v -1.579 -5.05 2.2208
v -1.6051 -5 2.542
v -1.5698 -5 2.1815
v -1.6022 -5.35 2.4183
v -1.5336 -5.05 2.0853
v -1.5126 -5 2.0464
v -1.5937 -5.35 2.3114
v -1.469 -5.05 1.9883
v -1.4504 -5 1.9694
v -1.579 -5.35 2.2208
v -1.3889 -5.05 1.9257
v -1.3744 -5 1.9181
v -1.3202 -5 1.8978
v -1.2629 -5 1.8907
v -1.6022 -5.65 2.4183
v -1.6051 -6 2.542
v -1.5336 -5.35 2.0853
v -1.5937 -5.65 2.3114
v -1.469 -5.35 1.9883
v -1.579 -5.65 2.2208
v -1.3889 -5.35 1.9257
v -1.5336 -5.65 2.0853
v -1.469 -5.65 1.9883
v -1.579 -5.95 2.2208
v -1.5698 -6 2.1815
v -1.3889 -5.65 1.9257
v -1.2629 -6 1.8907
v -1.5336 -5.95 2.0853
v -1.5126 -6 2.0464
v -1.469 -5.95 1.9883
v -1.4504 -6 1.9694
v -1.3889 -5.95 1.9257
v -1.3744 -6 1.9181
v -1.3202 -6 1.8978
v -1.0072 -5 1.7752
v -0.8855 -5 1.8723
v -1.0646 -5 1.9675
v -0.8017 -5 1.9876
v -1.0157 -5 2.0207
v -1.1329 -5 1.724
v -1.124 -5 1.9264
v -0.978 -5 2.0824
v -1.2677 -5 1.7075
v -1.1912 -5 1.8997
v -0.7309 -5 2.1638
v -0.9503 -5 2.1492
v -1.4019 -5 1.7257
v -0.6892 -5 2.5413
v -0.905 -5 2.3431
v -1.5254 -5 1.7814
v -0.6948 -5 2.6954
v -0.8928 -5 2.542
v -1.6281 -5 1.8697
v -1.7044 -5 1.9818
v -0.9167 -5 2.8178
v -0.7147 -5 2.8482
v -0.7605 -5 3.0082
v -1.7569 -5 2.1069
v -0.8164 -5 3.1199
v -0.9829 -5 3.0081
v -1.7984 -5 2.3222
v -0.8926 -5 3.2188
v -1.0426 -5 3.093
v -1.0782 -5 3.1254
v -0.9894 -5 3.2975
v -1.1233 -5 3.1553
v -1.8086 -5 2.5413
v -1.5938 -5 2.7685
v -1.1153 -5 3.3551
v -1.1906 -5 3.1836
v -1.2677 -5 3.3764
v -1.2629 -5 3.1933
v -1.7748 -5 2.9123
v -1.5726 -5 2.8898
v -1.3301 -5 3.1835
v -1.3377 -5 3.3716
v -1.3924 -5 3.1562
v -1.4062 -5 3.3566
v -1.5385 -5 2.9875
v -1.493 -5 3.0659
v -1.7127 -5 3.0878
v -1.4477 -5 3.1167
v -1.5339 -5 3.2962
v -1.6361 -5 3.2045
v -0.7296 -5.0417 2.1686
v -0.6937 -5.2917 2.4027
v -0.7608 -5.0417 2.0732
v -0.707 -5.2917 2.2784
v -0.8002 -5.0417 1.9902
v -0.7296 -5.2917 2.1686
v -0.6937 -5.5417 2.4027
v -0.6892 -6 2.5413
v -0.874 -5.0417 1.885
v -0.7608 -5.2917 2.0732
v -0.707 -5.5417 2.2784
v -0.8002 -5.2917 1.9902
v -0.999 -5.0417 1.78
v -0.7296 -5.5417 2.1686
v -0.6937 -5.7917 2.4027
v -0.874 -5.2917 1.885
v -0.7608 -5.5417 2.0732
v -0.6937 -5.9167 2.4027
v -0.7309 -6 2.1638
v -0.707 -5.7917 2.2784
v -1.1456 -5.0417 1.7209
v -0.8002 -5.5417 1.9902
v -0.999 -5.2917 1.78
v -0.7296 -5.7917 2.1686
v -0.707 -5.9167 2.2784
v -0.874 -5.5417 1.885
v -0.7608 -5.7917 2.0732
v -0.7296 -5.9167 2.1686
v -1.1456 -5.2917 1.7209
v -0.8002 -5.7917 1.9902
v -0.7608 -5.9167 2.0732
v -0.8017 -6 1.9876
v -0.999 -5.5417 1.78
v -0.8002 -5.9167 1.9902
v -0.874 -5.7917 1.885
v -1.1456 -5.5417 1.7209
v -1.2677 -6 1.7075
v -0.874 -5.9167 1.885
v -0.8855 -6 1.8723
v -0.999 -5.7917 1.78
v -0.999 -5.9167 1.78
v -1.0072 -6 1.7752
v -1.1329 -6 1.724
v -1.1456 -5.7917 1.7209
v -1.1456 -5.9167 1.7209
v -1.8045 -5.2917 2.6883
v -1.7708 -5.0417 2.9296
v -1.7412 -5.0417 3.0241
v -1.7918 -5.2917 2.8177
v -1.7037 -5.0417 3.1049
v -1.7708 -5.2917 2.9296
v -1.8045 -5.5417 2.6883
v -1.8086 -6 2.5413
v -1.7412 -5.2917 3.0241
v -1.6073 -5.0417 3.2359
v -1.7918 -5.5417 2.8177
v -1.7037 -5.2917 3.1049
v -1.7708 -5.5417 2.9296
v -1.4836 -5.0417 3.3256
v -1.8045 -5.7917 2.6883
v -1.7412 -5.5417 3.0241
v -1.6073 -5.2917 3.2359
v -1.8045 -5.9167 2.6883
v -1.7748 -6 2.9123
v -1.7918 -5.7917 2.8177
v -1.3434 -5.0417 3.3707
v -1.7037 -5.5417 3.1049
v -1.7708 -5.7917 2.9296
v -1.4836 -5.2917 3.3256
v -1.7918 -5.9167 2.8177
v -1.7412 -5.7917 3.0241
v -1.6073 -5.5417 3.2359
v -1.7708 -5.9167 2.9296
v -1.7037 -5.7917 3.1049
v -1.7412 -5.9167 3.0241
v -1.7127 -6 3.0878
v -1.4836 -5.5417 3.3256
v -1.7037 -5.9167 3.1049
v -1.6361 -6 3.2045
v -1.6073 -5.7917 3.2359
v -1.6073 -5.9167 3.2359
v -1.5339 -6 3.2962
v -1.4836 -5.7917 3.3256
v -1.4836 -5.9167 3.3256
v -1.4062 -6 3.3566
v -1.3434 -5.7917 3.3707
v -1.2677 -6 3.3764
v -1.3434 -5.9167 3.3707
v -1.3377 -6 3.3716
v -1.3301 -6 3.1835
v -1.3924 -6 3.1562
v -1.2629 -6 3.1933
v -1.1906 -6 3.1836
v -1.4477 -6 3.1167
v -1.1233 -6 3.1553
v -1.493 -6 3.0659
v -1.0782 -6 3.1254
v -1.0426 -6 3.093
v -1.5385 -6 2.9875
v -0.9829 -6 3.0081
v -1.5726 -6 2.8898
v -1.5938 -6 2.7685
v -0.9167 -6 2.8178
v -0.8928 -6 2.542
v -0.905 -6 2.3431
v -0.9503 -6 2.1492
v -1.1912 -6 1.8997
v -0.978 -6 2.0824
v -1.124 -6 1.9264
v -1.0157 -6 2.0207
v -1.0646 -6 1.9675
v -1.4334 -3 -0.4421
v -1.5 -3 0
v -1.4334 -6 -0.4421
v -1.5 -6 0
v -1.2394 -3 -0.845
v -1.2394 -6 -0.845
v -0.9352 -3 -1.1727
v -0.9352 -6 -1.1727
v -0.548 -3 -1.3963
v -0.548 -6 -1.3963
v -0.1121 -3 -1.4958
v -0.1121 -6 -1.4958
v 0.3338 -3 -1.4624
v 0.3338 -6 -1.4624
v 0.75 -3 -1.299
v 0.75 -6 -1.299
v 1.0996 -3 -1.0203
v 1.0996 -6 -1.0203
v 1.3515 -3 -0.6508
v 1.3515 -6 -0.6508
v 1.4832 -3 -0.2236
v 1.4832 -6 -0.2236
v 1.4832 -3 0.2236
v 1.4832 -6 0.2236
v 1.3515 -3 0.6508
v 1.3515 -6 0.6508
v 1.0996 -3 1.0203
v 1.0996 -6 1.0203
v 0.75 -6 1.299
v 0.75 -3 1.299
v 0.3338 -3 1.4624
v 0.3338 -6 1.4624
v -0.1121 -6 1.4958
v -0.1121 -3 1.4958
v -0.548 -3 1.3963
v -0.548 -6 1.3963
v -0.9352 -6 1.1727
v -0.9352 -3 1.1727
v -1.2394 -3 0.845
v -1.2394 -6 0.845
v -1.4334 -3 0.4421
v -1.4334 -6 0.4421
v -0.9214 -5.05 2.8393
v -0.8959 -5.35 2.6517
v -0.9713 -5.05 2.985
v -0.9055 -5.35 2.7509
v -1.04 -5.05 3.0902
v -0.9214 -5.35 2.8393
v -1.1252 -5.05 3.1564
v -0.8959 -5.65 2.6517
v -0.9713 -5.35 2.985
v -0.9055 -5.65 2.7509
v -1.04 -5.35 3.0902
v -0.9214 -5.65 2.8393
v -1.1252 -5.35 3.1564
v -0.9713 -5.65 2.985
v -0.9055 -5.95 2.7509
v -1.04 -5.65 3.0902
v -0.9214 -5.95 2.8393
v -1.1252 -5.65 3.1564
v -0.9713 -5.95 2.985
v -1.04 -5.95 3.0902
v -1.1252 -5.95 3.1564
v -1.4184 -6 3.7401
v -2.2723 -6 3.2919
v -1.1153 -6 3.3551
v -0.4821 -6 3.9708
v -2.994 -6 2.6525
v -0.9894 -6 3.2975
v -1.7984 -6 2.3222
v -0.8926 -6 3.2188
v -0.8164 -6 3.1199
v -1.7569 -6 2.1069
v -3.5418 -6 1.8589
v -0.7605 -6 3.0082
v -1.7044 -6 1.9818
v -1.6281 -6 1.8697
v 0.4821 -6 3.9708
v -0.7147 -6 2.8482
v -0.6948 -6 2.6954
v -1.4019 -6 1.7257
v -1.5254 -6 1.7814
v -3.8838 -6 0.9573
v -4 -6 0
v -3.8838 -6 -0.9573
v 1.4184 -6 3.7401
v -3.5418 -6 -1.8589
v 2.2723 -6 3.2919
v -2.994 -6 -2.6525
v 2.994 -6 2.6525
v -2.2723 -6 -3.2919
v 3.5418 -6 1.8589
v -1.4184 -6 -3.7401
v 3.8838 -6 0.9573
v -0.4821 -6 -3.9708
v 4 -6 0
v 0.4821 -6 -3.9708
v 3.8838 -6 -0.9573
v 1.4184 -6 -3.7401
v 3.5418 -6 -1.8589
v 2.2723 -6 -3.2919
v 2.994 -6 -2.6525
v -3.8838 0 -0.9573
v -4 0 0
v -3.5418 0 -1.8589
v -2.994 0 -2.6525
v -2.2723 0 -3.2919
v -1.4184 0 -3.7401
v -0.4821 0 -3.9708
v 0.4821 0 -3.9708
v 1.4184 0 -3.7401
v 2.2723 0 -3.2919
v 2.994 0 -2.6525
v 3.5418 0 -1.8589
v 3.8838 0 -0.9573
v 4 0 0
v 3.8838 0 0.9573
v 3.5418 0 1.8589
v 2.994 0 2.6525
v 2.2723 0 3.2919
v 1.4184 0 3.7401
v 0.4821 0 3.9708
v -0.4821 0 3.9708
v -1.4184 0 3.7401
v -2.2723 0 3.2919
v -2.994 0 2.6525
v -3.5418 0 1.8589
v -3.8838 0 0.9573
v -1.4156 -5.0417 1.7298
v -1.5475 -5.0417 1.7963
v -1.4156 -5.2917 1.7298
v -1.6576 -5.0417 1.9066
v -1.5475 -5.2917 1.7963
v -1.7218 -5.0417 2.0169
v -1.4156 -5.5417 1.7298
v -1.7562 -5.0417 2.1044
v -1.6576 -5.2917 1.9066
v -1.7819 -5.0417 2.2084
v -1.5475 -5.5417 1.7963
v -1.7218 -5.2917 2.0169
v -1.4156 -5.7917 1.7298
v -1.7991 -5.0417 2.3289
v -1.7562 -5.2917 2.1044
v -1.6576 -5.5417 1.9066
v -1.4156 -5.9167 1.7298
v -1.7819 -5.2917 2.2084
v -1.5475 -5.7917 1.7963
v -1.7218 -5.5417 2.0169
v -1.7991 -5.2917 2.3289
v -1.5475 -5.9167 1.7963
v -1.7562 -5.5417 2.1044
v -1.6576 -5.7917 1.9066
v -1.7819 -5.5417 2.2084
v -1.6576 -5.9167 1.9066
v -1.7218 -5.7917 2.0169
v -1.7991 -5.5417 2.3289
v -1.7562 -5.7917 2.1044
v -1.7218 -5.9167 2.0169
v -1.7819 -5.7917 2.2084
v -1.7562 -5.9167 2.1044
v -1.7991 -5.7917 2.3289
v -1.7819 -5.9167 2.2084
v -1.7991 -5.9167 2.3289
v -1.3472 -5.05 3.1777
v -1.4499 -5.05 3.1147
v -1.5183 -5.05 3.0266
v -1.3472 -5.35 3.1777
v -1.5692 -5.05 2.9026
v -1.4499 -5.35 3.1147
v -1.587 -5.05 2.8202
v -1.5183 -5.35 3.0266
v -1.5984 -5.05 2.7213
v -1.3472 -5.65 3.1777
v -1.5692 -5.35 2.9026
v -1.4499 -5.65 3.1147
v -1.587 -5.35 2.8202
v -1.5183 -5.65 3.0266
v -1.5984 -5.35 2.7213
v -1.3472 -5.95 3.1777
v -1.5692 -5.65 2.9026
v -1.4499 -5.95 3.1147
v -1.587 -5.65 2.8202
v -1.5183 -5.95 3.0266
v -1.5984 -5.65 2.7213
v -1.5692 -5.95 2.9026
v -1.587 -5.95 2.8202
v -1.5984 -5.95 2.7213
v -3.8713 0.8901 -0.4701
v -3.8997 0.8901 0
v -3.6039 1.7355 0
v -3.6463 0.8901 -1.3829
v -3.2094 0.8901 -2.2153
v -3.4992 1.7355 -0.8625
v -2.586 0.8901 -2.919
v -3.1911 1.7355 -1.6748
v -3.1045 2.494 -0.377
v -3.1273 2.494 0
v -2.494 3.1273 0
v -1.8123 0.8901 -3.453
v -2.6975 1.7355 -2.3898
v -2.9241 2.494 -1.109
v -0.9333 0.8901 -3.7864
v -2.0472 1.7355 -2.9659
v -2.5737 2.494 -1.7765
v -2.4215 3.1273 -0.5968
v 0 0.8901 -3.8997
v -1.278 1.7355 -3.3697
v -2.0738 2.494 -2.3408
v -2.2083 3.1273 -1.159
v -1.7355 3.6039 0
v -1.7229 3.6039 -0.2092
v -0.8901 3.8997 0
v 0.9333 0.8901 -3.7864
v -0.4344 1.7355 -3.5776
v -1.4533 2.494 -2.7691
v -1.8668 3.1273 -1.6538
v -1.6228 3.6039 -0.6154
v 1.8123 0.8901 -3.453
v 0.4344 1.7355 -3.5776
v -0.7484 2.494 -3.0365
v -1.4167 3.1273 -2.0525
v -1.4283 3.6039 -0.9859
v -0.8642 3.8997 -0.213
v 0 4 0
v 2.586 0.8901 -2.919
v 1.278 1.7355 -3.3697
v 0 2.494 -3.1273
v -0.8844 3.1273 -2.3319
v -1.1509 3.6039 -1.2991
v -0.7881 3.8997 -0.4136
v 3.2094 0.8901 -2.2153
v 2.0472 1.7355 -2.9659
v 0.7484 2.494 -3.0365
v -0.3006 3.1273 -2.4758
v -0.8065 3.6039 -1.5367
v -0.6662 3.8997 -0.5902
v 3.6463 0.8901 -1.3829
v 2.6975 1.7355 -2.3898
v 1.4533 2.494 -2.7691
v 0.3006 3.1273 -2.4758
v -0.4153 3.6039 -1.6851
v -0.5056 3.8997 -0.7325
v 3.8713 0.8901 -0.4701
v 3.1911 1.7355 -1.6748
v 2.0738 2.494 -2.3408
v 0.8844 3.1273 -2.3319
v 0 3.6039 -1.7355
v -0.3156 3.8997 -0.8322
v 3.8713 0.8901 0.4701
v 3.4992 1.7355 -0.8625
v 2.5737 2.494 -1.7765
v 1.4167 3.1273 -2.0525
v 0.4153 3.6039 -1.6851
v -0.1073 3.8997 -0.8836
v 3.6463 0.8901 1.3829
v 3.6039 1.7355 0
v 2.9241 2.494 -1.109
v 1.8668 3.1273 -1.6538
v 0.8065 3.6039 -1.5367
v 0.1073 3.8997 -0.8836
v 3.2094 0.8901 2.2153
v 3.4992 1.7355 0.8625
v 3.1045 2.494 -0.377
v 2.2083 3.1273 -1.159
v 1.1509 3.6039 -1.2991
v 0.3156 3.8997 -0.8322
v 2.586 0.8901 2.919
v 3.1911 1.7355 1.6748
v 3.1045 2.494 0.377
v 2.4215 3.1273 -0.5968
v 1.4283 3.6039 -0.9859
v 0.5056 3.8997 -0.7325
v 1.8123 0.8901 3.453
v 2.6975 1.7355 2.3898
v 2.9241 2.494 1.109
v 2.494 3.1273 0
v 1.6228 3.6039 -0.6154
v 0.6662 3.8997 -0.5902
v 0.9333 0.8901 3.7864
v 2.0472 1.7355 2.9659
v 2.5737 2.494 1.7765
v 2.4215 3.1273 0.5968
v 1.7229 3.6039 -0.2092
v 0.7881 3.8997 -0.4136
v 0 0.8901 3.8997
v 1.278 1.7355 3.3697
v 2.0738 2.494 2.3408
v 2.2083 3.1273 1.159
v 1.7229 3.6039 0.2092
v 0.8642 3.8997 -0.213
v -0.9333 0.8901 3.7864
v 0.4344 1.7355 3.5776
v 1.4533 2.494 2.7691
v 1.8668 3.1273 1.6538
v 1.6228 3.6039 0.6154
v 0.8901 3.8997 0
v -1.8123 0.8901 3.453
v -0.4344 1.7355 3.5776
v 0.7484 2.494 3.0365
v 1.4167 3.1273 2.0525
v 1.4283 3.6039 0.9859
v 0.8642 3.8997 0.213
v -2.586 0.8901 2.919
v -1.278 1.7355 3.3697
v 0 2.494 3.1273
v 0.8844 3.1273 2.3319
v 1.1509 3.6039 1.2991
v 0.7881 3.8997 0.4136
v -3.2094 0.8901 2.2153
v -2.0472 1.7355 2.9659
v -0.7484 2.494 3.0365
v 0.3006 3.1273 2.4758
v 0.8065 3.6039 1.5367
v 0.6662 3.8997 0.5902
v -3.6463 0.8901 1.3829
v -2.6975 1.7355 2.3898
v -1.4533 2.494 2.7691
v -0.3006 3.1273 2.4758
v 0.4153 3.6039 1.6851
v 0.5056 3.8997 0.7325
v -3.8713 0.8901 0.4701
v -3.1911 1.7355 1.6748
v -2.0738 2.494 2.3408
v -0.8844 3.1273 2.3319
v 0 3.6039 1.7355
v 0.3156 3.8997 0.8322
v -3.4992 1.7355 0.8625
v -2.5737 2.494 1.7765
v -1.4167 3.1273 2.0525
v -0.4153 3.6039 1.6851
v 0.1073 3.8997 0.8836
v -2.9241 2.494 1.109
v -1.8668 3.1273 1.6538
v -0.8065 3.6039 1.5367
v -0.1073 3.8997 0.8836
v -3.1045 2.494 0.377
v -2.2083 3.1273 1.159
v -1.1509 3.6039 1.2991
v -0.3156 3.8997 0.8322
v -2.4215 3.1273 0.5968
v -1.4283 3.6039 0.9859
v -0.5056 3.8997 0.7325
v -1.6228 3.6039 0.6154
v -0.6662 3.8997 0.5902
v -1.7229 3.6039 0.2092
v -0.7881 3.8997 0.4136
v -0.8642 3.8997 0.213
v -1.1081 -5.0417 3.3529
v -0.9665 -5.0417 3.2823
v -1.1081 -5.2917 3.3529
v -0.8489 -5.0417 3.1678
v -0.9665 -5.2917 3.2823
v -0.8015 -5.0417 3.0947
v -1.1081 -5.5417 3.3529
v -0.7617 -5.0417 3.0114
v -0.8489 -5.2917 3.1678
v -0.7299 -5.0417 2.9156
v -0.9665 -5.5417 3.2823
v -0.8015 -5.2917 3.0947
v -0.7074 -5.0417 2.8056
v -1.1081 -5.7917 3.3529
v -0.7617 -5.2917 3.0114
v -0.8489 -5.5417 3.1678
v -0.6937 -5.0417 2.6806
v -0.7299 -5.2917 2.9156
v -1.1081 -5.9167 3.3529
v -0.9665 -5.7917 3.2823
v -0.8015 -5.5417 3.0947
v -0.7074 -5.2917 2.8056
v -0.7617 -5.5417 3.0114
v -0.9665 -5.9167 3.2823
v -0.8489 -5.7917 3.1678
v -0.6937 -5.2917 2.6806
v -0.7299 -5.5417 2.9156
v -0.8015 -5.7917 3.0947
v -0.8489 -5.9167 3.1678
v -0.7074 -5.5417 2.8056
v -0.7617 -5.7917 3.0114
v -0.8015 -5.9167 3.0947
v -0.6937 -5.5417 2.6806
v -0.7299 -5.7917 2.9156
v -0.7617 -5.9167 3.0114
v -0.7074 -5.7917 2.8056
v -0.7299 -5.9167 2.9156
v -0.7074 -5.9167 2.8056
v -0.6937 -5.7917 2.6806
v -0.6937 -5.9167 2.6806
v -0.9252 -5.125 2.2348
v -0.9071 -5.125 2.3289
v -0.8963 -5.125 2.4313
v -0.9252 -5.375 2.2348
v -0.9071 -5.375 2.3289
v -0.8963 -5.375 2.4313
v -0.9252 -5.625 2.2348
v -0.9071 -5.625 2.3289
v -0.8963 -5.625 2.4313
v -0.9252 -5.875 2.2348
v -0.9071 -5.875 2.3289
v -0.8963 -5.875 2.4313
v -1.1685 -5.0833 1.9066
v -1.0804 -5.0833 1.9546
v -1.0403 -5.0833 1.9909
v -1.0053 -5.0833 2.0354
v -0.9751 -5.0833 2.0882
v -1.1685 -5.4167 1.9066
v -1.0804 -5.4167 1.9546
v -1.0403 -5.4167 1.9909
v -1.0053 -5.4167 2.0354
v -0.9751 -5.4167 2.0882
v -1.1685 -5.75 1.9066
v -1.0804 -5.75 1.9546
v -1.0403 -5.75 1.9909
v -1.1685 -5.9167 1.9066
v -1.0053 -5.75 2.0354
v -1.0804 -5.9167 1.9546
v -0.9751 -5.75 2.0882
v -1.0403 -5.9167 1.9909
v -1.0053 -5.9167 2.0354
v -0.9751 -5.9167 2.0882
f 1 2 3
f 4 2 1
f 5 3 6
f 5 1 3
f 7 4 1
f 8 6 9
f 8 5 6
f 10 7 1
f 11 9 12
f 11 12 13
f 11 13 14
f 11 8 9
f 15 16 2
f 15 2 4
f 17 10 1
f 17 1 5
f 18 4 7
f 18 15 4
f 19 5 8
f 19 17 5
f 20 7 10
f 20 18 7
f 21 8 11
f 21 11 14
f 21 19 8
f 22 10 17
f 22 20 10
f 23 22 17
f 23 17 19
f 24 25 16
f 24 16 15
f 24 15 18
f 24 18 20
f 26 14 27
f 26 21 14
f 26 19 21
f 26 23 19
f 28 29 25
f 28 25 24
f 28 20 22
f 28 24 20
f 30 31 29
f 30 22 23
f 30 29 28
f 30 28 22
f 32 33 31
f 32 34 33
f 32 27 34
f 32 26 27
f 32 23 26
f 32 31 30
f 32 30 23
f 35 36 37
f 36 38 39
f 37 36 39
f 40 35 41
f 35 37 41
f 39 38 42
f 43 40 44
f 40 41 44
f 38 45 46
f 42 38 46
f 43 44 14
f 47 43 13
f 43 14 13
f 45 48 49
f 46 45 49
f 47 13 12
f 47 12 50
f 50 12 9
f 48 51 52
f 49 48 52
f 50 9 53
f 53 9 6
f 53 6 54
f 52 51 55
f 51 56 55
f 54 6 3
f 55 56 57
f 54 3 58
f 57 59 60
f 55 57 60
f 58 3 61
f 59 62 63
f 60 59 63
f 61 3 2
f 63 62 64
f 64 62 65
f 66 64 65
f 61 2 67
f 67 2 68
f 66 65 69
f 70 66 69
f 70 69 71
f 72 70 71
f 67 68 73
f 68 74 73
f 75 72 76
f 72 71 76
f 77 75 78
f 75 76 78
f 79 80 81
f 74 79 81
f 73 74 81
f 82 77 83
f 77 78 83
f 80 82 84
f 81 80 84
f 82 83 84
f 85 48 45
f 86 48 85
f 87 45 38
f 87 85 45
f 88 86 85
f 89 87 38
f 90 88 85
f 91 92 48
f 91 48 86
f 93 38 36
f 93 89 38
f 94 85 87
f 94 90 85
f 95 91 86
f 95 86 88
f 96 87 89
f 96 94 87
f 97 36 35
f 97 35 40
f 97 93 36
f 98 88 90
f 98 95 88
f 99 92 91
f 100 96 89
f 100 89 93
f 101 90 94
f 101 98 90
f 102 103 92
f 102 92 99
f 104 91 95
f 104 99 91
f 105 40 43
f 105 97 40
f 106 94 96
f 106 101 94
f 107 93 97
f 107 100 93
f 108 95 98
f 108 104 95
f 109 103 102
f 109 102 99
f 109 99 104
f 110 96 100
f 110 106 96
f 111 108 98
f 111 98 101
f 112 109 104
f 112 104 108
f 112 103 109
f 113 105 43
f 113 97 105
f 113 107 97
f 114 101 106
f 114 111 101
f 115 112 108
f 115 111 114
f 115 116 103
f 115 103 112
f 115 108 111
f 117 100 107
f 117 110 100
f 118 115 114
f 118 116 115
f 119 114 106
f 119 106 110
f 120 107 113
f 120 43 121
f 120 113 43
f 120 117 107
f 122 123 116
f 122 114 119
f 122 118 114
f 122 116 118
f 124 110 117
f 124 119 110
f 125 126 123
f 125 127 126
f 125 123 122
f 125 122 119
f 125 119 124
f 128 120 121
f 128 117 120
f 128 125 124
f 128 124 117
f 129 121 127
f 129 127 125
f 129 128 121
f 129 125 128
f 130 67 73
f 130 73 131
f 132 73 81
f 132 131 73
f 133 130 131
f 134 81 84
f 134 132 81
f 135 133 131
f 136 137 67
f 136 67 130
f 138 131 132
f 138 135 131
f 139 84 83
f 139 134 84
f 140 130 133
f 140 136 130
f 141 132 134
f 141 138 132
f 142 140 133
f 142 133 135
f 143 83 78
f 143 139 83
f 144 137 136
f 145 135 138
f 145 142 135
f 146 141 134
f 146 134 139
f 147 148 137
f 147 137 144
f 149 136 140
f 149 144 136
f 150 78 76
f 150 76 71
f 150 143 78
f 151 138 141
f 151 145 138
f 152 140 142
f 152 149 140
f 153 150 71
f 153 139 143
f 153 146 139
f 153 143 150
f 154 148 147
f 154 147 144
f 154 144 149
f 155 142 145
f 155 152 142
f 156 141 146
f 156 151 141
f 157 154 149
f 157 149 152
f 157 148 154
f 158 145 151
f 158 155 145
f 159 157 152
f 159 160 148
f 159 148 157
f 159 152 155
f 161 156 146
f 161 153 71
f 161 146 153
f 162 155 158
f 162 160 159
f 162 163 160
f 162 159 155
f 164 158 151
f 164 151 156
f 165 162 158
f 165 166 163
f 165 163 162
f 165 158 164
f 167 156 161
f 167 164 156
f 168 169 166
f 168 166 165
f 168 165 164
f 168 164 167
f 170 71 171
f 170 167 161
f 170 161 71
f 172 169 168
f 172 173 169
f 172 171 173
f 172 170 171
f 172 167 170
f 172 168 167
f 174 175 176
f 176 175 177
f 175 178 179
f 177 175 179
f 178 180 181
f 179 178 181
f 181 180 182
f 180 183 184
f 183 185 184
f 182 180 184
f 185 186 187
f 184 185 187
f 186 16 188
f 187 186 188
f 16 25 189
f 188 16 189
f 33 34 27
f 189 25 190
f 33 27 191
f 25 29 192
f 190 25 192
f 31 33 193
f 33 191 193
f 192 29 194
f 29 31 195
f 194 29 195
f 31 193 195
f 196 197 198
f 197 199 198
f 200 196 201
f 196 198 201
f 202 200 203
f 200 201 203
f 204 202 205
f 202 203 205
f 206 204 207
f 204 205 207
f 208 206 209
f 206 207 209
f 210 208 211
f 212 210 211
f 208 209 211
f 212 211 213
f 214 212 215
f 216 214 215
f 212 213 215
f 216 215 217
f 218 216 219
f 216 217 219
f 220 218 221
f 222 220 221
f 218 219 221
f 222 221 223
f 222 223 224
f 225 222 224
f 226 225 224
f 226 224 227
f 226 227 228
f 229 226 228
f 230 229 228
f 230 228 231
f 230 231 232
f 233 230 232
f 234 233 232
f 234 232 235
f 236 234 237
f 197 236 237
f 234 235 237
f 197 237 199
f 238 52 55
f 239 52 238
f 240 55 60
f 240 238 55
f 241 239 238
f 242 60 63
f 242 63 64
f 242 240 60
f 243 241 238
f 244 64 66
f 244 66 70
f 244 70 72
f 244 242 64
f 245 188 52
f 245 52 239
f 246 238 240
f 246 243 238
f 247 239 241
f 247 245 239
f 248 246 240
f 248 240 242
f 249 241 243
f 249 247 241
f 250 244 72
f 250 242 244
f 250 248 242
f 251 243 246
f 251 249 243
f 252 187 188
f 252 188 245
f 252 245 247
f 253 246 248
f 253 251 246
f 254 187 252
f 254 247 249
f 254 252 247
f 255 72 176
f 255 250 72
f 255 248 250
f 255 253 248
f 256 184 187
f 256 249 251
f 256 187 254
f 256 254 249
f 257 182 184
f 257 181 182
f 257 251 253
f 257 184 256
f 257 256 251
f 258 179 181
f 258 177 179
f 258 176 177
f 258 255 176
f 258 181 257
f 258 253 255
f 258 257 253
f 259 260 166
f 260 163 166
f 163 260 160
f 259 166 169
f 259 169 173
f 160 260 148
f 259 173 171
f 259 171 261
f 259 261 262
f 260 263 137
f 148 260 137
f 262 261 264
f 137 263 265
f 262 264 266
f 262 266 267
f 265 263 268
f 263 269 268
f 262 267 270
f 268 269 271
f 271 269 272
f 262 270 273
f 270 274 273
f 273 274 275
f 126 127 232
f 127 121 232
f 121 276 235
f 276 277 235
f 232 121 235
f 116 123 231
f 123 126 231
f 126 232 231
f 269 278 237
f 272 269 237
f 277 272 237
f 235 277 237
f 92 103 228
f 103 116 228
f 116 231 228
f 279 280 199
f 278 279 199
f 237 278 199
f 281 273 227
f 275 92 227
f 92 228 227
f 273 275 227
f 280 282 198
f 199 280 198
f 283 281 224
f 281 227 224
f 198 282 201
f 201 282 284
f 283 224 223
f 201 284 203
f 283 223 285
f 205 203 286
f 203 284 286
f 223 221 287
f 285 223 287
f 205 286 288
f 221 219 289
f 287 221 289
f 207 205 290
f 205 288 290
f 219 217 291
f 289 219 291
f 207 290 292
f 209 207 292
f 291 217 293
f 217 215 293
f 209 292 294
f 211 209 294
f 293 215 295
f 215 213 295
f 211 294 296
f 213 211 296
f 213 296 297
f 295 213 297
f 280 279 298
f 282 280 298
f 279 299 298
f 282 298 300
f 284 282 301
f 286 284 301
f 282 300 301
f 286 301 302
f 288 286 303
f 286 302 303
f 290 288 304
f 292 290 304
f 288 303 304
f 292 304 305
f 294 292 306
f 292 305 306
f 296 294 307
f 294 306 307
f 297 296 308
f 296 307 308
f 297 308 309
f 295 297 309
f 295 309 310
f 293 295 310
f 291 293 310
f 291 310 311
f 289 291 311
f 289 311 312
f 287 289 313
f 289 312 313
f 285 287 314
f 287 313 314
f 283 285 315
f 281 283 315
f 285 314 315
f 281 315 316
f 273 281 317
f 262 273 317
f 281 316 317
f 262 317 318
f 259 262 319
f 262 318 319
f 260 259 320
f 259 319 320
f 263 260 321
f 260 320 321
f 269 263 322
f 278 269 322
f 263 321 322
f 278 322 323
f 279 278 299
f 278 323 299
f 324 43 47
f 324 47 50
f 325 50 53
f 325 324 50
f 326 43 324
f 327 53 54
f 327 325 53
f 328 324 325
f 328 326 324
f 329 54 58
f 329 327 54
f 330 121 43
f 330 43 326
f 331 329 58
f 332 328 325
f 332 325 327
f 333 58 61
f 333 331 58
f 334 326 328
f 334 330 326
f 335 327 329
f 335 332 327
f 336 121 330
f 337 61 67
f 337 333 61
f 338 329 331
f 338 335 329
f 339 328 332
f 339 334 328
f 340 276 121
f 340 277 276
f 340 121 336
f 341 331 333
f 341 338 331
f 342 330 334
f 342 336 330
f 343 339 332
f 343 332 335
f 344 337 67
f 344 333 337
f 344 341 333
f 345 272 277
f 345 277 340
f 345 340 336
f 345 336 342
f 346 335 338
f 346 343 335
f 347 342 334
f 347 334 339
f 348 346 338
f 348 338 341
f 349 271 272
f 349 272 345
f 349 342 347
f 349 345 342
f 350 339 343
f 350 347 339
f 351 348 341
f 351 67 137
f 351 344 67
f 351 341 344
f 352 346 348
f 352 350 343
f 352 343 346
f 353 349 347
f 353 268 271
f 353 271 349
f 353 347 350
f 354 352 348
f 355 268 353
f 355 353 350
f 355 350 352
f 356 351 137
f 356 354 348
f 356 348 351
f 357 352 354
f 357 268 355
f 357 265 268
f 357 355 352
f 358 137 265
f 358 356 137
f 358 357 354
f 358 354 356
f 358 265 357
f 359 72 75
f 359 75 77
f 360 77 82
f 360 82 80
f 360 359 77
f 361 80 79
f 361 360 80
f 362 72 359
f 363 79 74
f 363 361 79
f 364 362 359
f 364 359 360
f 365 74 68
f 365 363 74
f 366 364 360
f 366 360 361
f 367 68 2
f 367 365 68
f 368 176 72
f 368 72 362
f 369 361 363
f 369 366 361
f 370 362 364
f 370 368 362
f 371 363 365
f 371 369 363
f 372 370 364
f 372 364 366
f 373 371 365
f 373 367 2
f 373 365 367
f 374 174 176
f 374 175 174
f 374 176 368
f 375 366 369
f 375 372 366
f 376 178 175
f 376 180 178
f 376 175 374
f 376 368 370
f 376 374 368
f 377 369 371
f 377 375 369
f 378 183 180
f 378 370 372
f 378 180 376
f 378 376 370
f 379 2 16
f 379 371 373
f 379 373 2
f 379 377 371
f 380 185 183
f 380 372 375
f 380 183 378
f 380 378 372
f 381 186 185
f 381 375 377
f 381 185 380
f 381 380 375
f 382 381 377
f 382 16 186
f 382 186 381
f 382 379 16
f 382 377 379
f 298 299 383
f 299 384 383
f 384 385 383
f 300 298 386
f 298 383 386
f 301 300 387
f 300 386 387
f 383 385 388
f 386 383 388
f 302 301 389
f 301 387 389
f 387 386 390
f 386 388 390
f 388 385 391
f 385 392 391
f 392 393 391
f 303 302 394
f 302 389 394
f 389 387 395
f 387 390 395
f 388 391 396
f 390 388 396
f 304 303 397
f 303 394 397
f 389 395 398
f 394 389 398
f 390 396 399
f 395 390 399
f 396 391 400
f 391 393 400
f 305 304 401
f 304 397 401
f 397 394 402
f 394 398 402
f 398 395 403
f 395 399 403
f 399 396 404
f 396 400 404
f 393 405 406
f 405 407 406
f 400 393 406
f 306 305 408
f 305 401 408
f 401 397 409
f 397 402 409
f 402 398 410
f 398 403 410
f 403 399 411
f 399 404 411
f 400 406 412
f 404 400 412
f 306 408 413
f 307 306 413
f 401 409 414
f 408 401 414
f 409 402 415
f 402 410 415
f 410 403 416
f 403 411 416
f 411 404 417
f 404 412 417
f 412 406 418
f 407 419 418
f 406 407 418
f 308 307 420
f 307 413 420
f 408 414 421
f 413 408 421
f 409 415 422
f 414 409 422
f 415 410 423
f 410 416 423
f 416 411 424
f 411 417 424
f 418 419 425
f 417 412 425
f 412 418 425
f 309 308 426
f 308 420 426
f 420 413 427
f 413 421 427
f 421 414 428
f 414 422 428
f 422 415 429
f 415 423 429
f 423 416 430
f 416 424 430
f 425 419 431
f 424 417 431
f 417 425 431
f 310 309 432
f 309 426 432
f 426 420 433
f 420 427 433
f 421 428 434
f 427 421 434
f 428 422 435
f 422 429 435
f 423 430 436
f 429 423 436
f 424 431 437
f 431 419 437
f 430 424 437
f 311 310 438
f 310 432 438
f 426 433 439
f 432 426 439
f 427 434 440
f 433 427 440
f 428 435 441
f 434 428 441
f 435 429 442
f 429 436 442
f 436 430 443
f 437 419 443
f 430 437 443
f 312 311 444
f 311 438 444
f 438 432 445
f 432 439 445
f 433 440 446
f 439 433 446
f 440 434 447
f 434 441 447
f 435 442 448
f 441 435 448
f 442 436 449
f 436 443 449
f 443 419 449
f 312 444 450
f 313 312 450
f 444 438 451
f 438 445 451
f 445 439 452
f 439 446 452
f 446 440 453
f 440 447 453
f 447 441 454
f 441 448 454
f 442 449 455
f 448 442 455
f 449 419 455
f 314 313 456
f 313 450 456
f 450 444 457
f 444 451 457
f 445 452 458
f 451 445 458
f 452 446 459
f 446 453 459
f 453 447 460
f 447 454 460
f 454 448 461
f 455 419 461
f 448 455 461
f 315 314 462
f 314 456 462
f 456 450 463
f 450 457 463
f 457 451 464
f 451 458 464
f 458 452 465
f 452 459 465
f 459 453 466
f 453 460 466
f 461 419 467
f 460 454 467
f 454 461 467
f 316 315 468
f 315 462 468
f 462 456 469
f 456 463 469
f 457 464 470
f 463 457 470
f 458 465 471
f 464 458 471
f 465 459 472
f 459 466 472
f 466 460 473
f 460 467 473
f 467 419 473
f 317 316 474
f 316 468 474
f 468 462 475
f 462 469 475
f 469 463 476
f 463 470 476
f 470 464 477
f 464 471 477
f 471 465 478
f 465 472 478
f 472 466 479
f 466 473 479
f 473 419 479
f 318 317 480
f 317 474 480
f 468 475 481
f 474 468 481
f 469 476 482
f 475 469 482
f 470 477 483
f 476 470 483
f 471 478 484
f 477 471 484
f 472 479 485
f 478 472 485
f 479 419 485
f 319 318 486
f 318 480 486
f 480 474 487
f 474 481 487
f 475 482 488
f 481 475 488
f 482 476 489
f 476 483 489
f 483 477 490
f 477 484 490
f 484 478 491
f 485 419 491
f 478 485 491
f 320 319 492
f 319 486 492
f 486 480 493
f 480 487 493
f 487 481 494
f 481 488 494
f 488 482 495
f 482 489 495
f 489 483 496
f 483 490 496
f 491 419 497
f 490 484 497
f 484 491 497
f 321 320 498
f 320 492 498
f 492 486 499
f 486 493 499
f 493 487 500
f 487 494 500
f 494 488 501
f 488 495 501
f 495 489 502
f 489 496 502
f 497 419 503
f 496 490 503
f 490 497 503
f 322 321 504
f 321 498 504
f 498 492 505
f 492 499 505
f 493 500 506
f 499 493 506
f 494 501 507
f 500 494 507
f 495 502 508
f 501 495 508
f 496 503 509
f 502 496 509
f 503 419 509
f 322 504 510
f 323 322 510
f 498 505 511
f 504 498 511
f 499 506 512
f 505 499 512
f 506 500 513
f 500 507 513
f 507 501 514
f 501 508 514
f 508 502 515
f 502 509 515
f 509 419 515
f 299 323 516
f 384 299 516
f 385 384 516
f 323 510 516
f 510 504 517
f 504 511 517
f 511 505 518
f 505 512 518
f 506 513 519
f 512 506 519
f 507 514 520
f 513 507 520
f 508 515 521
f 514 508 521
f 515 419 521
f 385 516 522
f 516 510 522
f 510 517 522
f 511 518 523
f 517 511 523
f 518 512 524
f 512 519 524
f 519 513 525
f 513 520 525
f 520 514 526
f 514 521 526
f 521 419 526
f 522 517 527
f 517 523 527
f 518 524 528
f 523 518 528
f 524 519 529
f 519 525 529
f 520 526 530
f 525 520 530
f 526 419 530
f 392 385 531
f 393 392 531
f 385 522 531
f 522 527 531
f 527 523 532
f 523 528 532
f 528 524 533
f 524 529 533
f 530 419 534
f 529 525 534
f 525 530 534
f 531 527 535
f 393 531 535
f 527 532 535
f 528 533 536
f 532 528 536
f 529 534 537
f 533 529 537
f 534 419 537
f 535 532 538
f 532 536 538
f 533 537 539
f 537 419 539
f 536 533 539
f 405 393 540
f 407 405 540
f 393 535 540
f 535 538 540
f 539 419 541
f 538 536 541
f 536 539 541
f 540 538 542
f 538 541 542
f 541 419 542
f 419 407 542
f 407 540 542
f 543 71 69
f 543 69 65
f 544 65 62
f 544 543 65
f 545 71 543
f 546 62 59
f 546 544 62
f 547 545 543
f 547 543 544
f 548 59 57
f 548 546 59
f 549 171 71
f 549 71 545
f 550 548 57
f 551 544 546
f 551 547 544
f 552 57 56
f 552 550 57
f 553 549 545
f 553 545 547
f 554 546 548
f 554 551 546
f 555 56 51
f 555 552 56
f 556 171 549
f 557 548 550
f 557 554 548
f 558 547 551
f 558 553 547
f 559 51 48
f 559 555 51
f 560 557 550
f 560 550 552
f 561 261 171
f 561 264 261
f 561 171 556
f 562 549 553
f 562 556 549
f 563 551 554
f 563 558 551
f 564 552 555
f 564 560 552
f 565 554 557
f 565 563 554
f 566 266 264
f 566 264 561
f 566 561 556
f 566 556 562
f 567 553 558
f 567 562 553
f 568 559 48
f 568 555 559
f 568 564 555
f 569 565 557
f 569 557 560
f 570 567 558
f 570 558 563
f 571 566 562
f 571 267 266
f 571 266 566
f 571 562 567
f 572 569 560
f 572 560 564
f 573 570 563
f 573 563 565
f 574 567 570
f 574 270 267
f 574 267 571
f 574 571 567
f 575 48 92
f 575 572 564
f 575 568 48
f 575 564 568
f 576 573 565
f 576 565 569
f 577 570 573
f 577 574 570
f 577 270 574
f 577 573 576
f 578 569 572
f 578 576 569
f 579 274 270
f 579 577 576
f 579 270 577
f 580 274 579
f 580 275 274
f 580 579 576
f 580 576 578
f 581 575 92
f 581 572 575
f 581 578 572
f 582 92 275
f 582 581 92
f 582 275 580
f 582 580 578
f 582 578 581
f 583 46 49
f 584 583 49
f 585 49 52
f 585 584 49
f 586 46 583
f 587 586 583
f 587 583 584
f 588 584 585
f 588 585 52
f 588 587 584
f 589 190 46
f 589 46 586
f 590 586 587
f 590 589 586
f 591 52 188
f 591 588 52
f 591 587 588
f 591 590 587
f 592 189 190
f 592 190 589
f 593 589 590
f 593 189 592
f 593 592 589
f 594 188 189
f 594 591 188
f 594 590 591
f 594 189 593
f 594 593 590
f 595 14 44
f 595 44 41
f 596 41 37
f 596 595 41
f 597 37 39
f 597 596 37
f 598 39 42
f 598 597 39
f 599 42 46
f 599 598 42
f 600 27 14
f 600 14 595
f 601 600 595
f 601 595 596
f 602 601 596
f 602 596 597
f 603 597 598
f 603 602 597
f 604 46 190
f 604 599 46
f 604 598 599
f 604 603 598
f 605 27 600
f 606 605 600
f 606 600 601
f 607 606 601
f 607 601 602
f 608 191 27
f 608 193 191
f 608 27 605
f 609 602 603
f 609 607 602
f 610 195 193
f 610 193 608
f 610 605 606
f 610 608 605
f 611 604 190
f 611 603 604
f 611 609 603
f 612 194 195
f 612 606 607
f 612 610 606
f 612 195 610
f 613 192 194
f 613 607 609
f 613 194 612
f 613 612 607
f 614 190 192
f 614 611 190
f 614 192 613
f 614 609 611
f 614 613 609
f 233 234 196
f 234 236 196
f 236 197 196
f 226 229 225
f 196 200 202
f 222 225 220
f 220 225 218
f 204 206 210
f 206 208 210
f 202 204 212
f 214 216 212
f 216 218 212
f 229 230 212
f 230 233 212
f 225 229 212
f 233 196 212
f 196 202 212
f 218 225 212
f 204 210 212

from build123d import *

# Parameters (mm, degrees)
ENL_V_MAT_EXTRU_1_DEPTH = 1


with BuildPart() as part:
    # Esquisse2 → Révolution2 (revolve)
    with BuildSketch(Plane.XY):
        with BuildLine():
            Line((-1.5, -3), (-1.5, -6))
            Line((-1.5, -6), (-4, -6))
            Line((-4, -6), (-4, 0))
            ThreePointArc((-4, 0), (-2.828427125, 2.828427125), (0, 4))
            Line((0, 4), (0, -3))
            Line((0, -3), (-1.5, -3))
        make_face()
    revolve(axis=Axis((0, 4, 0), (0, -1, 0)))

    # Esquisse3 → Enlèv. mat.-Extru.1 (cut)
    with BuildSketch(Plane.XZ.offset(6)):
        with BuildLine():
            add(Edge.make_bspline(
                [(-1.80863124, 2.541345123), (-1.808479721, 2.566576945), (-1.808185465, 2.615578129), (-1.805014729, 2.686862301), (-1.799544973, 2.753773198), (-1.792519265, 2.816312807), (-1.782799384, 2.874524095), (-1.771677826, 2.928435828), (-1.75798753, 2.978054639), (-1.741996794, 3.023469068), (-1.724042414, 3.06548569), (-1.704301487, 3.104630802), (-1.682899044, 3.141401404), (-1.659979633, 3.175784688), (-1.634459695, 3.207014642), (-1.607837422, 3.236160804), (-1.579113212, 3.262654216), (-1.548550296, 3.286362241), (-1.516934602, 3.307796564), (-1.483892299, 3.325862839), (-1.450188991, 3.341600286), (-1.415394884, 3.354330516), (-1.379762252, 3.364219477), (-1.343163483, 3.371125489), (-1.305772607, 3.375881264), (-1.280433508, 3.376250629), (-1.267698248, 3.376436269)],
                knots=[0, 0, 0, 0, 1.622528522, 3.151013738, 4.587225782, 5.939257941, 7.196658267, 8.381214254, 9.47772444, 10.503964975, 11.475138444, 12.414102326, 13.321377868, 14.209997518, 15.068075989, 15.912287155, 16.746865696, 17.577313739, 18.397854368, 19.200328723, 19.996378645, 20.787862277, 21.580050128, 22.371504404, 23.181529048, 24, 24, 24, 24], degree=3))
            add(Edge.make_bspline(
                [(-1.267698248, 3.376436269), (-1.253805469, 3.376070417), (-1.226383591, 3.37534829), (-1.185688202, 3.371418433), (-1.146357234, 3.363478815), (-1.107851049, 3.353522224), (-1.070793349, 3.339911348), (-1.034450069, 3.324259466), (-0.999939833, 3.304434891), (-0.966085568, 3.282749499), (-0.934048036, 3.25774196), (-0.903405408, 3.230569518), (-0.875113051, 3.200304639), (-0.848139657, 3.16798873), (-0.823868807, 3.132356169), (-0.800763662, 3.094654654), (-0.780305532, 3.05394524), (-0.760895229, 3.010948076), (-0.74421092, 2.964519866), (-0.729110025, 2.91492575), (-0.716872402, 2.861547844), (-0.706720882, 2.804552033), (-0.698897695, 2.743842361), (-0.693120072, 2.679563038), (-0.690103596, 2.611653966), (-0.689533129, 2.565198361), (-0.689240215, 2.541345123)],
                knots=[0, 0, 0, 0, 0.875057392, 1.727207867, 2.570264412, 3.399251263, 4.229017074, 5.053828049, 5.887584622, 6.731829445, 7.583639997, 8.443960147, 9.308026848, 10.190032267, 11.091770676, 12.020167189, 12.972467704, 13.958579741, 14.989078804, 16.076606933, 17.221320015, 18.435081626, 19.720875061, 21.074561036, 22.497895074, 24, 24, 24, 24], degree=3))
            add(Edge.make_bspline(
                [(-0.689240215, 2.541345123), (-0.689536199, 2.517598254), (-0.690112578, 2.471355268), (-0.693085762, 2.403758625), (-0.699013134, 2.339828893), (-0.706311275, 2.279386639), (-0.716548088, 2.222615428), (-0.729012582, 2.169485269), (-0.742990504, 2.11971682), (-0.760077838, 2.073746258), (-0.778998468, 2.030799872), (-0.799526075, 1.99045447), (-0.822133943, 1.952630546), (-0.847166636, 1.917738486), (-0.873431331, 1.884680376), (-0.902069059, 1.854605169), (-0.93255791, 1.826939612), (-0.96482414, 1.802036036), (-0.998498431, 1.779578013), (-1.033792029, 1.760620727), (-1.069815262, 1.743794249), (-1.107372434, 1.731042265), (-1.145702223, 1.720159494), (-1.185450047, 1.713129804), (-1.226246928, 1.70847555), (-1.253798722, 1.707844413), (-1.267698248, 1.707526012)],
                knots=[0, 0, 0, 0, 1.496607488, 2.914388442, 4.262485651, 5.541812885, 6.749953981, 7.895567619, 8.980172623, 10.005210728, 10.983286874, 11.936336572, 12.856292636, 13.757107149, 14.640766483, 15.514956722, 16.370989637, 17.232841377, 18.081413197, 18.918442167, 19.755471137, 20.583656588, 21.41504191, 22.264086897, 23.124254193, 24, 24, 24, 24], degree=3))
            add(Edge.make_bspline(
                [(-1.267698248, 1.707526012), (-1.28053559, 1.707744144), (-1.305960862, 1.708176169), (-1.343505356, 1.712413318), (-1.38007908, 1.719445505), (-1.415574616, 1.729301415), (-1.450241362, 1.741814634), (-1.483928981, 1.756972649), (-1.516416052, 1.775327151), (-1.54801261, 1.795949979), (-1.578259763, 1.819406928), (-1.6064329, 1.845919153), (-1.633209394, 1.874853048), (-1.658058785, 1.906520629), (-1.68153021, 1.940717467), (-1.70268935, 1.977765743), (-1.722416535, 2.017269766), (-1.740706112, 2.059533815), (-1.757219877, 2.105292204), (-1.770391091, 2.155440158), (-1.782811418, 2.209430466), (-1.79192615, 2.267809314), (-1.799834358, 2.33013628), (-1.804422361, 2.396815965), (-1.808343164, 2.467627223), (-1.808533454, 2.51632197), (-1.80863124, 2.541345123)],
                knots=[0, 0, 0, 0, 0.82614074, 1.636230647, 2.42850654, 3.22151677, 4.005075515, 4.799112676, 5.596456327, 6.404618302, 7.226350817, 8.05679228, 8.892237205, 9.761873943, 10.645770802, 11.559890835, 12.505927976, 13.487073095, 14.523090282, 15.633895838, 16.822583925, 18.088023083, 19.435493537, 20.865857947, 22.389433785, 24, 24, 24, 24], degree=3))
        make_face()
        with BuildLine():
            add(Edge.make_bspline(
                [(-1.605105599, 2.541981141), (-1.605023852, 2.520672046), (-1.604865594, 2.479419233), (-1.602515721, 2.419724601), (-1.599170136, 2.364139577), (-1.59416568, 2.312679231), (-1.587492401, 2.265267043), (-1.579593913, 2.22196849), (-1.570588452, 2.182700619), (-1.559609283, 2.147398904), (-1.547452492, 2.115233539), (-1.533935704, 2.085621273), (-1.519900759, 2.057891237), (-1.504090822, 2.032593058), (-1.487347707, 2.00938102), (-1.469369083, 1.988343478), (-1.450796759, 1.969019299), (-1.424302992, 1.947561621), (-1.390356536, 1.925127641), (-1.348216049, 1.905674198), (-1.305758021, 1.892833006), (-1.277113233, 1.891405835), (-1.262928115, 1.890699089)],
                knots=[0, 0, 0, 0, 1.564601651, 3.028951736, 4.386019676, 5.653114642, 6.824348509, 7.900668805, 8.88431448, 9.780488761, 10.613163047, 11.407444027, 12.169849642, 12.89344098, 13.595615509, 14.26934431, 14.924332585, 15.560171042, 16.769153194, 17.901006317, 18.960562374, 20, 20, 20, 20], degree=3))
            add(Edge.make_bspline(
                [(-1.262928115, 1.890699089), (-1.246853522, 1.891540168), (-1.214804369, 1.893217091), (-1.167603677, 1.905427209), (-1.122345984, 1.925920174), (-1.086485855, 1.949072591), (-1.05939208, 1.971591143), (-1.039825463, 1.990761174), (-1.02179068, 2.012163191), (-1.004765256, 2.035471294), (-0.989370848, 2.06106677), (-0.974527097, 2.088368697), (-0.961602786, 2.118032092), (-0.95413322, 2.138702882), (-0.950325451, 2.149240255)],
                knots=[0, 0, 0, 0, 1.331887272, 2.655486065, 4.012646414, 5.436183829, 6.178803566, 6.930724497, 7.703763371, 8.496530827, 9.320959298, 10.178042319, 11.071218497, 12, 12, 12, 12], degree=3))
            add(Edge.make_bspline(
                [(-0.950325451, 2.149240255), (-0.945737968, 2.163084868), (-0.936386065, 2.191308069), (-0.924669416, 2.235249723), (-0.914969473, 2.281357725), (-0.906617281, 2.329386525), (-0.90027545, 2.37957809), (-0.895891912, 2.431884075), (-0.893377451, 2.486304801), (-0.892971987, 2.523216067), (-0.892765856, 2.541981141)],
                knots=[0, 0, 0, 0, 0.877617242, 1.789083553, 2.735016418, 3.71249782, 4.722174671, 5.778575778, 6.870664861, 8, 8, 8, 8], degree=3))
            add(Edge.make_bspline(
                [(-0.892765856, 2.541981141), (-0.892815192, 2.560748136), (-0.892911405, 2.597346919), (-0.895770969, 2.650881984), (-0.899229308, 2.701840221), (-0.905195582, 2.750054281), (-0.911872778, 2.795764776), (-0.921031545, 2.838648534), (-0.930854849, 2.879133664), (-0.943127016, 2.916720139), (-0.956544156, 2.951787091), (-0.970695385, 2.984451245), (-0.985996373, 3.014738738), (-1.002854445, 3.04226954), (-1.020647463, 3.06749779), (-1.039441811, 3.090271765), (-1.05951754, 3.110463274), (-1.087584092, 3.133229632), (-1.123765401, 3.156924472), (-1.169007106, 3.178189343), (-1.215723695, 3.190725625), (-1.247275437, 3.192421751), (-1.262928115, 3.193263192)],
                knots=[0, 0, 0, 0, 1.353201578, 2.638969622, 3.865559904, 5.035676431, 6.141732754, 7.195734042, 8.19695873, 9.144657206, 10.044788335, 10.904062871, 11.710933862, 12.489720227, 13.229995877, 13.935715626, 14.616825307, 15.279494989, 16.538995736, 17.725922936, 18.871840505, 20, 20, 20, 20], degree=3))
            add(Edge.make_bspline(
                [(-1.262928115, 3.193263192), (-1.277109142, 3.192542637), (-1.305847895, 3.191082387), (-1.348370358, 3.178419537), (-1.390359144, 3.158811848), (-1.424078124, 3.13636234), (-1.450352786, 3.114927418), (-1.469178663, 3.096042766), (-1.486571406, 3.074886349), (-1.503356006, 3.051861153), (-1.518682213, 3.02639658), (-1.533568016, 2.998957155), (-1.546683445, 2.96908953), (-1.559017747, 2.936899522), (-1.569881275, 2.90153329), (-1.579275962, 2.86232535), (-1.587671251, 2.819074671), (-1.593721707, 2.771566799), (-1.598807927, 2.720028274), (-1.602614415, 2.664356134), (-1.604836941, 2.604541443), (-1.605014092, 2.563289689), (-1.605105599, 2.541981141)],
                knots=[0, 0, 0, 0, 1.039778295, 2.107176824, 3.232337611, 4.43520669, 5.071253539, 5.720927637, 6.389866065, 7.081397607, 7.811854436, 8.571243718, 9.372887587, 10.205834777, 11.102302774, 12.088086757, 13.166194718, 14.33675119, 15.604261439, 16.970055543, 18.43488556, 20, 20, 20, 20], degree=3))
        make_face(mode=Mode.SUBTRACT)
    extrude(amount=-ENL_V_MAT_EXTRU_1_DEPTH, mode=Mode.SUBTRACT)


solid = part.part
